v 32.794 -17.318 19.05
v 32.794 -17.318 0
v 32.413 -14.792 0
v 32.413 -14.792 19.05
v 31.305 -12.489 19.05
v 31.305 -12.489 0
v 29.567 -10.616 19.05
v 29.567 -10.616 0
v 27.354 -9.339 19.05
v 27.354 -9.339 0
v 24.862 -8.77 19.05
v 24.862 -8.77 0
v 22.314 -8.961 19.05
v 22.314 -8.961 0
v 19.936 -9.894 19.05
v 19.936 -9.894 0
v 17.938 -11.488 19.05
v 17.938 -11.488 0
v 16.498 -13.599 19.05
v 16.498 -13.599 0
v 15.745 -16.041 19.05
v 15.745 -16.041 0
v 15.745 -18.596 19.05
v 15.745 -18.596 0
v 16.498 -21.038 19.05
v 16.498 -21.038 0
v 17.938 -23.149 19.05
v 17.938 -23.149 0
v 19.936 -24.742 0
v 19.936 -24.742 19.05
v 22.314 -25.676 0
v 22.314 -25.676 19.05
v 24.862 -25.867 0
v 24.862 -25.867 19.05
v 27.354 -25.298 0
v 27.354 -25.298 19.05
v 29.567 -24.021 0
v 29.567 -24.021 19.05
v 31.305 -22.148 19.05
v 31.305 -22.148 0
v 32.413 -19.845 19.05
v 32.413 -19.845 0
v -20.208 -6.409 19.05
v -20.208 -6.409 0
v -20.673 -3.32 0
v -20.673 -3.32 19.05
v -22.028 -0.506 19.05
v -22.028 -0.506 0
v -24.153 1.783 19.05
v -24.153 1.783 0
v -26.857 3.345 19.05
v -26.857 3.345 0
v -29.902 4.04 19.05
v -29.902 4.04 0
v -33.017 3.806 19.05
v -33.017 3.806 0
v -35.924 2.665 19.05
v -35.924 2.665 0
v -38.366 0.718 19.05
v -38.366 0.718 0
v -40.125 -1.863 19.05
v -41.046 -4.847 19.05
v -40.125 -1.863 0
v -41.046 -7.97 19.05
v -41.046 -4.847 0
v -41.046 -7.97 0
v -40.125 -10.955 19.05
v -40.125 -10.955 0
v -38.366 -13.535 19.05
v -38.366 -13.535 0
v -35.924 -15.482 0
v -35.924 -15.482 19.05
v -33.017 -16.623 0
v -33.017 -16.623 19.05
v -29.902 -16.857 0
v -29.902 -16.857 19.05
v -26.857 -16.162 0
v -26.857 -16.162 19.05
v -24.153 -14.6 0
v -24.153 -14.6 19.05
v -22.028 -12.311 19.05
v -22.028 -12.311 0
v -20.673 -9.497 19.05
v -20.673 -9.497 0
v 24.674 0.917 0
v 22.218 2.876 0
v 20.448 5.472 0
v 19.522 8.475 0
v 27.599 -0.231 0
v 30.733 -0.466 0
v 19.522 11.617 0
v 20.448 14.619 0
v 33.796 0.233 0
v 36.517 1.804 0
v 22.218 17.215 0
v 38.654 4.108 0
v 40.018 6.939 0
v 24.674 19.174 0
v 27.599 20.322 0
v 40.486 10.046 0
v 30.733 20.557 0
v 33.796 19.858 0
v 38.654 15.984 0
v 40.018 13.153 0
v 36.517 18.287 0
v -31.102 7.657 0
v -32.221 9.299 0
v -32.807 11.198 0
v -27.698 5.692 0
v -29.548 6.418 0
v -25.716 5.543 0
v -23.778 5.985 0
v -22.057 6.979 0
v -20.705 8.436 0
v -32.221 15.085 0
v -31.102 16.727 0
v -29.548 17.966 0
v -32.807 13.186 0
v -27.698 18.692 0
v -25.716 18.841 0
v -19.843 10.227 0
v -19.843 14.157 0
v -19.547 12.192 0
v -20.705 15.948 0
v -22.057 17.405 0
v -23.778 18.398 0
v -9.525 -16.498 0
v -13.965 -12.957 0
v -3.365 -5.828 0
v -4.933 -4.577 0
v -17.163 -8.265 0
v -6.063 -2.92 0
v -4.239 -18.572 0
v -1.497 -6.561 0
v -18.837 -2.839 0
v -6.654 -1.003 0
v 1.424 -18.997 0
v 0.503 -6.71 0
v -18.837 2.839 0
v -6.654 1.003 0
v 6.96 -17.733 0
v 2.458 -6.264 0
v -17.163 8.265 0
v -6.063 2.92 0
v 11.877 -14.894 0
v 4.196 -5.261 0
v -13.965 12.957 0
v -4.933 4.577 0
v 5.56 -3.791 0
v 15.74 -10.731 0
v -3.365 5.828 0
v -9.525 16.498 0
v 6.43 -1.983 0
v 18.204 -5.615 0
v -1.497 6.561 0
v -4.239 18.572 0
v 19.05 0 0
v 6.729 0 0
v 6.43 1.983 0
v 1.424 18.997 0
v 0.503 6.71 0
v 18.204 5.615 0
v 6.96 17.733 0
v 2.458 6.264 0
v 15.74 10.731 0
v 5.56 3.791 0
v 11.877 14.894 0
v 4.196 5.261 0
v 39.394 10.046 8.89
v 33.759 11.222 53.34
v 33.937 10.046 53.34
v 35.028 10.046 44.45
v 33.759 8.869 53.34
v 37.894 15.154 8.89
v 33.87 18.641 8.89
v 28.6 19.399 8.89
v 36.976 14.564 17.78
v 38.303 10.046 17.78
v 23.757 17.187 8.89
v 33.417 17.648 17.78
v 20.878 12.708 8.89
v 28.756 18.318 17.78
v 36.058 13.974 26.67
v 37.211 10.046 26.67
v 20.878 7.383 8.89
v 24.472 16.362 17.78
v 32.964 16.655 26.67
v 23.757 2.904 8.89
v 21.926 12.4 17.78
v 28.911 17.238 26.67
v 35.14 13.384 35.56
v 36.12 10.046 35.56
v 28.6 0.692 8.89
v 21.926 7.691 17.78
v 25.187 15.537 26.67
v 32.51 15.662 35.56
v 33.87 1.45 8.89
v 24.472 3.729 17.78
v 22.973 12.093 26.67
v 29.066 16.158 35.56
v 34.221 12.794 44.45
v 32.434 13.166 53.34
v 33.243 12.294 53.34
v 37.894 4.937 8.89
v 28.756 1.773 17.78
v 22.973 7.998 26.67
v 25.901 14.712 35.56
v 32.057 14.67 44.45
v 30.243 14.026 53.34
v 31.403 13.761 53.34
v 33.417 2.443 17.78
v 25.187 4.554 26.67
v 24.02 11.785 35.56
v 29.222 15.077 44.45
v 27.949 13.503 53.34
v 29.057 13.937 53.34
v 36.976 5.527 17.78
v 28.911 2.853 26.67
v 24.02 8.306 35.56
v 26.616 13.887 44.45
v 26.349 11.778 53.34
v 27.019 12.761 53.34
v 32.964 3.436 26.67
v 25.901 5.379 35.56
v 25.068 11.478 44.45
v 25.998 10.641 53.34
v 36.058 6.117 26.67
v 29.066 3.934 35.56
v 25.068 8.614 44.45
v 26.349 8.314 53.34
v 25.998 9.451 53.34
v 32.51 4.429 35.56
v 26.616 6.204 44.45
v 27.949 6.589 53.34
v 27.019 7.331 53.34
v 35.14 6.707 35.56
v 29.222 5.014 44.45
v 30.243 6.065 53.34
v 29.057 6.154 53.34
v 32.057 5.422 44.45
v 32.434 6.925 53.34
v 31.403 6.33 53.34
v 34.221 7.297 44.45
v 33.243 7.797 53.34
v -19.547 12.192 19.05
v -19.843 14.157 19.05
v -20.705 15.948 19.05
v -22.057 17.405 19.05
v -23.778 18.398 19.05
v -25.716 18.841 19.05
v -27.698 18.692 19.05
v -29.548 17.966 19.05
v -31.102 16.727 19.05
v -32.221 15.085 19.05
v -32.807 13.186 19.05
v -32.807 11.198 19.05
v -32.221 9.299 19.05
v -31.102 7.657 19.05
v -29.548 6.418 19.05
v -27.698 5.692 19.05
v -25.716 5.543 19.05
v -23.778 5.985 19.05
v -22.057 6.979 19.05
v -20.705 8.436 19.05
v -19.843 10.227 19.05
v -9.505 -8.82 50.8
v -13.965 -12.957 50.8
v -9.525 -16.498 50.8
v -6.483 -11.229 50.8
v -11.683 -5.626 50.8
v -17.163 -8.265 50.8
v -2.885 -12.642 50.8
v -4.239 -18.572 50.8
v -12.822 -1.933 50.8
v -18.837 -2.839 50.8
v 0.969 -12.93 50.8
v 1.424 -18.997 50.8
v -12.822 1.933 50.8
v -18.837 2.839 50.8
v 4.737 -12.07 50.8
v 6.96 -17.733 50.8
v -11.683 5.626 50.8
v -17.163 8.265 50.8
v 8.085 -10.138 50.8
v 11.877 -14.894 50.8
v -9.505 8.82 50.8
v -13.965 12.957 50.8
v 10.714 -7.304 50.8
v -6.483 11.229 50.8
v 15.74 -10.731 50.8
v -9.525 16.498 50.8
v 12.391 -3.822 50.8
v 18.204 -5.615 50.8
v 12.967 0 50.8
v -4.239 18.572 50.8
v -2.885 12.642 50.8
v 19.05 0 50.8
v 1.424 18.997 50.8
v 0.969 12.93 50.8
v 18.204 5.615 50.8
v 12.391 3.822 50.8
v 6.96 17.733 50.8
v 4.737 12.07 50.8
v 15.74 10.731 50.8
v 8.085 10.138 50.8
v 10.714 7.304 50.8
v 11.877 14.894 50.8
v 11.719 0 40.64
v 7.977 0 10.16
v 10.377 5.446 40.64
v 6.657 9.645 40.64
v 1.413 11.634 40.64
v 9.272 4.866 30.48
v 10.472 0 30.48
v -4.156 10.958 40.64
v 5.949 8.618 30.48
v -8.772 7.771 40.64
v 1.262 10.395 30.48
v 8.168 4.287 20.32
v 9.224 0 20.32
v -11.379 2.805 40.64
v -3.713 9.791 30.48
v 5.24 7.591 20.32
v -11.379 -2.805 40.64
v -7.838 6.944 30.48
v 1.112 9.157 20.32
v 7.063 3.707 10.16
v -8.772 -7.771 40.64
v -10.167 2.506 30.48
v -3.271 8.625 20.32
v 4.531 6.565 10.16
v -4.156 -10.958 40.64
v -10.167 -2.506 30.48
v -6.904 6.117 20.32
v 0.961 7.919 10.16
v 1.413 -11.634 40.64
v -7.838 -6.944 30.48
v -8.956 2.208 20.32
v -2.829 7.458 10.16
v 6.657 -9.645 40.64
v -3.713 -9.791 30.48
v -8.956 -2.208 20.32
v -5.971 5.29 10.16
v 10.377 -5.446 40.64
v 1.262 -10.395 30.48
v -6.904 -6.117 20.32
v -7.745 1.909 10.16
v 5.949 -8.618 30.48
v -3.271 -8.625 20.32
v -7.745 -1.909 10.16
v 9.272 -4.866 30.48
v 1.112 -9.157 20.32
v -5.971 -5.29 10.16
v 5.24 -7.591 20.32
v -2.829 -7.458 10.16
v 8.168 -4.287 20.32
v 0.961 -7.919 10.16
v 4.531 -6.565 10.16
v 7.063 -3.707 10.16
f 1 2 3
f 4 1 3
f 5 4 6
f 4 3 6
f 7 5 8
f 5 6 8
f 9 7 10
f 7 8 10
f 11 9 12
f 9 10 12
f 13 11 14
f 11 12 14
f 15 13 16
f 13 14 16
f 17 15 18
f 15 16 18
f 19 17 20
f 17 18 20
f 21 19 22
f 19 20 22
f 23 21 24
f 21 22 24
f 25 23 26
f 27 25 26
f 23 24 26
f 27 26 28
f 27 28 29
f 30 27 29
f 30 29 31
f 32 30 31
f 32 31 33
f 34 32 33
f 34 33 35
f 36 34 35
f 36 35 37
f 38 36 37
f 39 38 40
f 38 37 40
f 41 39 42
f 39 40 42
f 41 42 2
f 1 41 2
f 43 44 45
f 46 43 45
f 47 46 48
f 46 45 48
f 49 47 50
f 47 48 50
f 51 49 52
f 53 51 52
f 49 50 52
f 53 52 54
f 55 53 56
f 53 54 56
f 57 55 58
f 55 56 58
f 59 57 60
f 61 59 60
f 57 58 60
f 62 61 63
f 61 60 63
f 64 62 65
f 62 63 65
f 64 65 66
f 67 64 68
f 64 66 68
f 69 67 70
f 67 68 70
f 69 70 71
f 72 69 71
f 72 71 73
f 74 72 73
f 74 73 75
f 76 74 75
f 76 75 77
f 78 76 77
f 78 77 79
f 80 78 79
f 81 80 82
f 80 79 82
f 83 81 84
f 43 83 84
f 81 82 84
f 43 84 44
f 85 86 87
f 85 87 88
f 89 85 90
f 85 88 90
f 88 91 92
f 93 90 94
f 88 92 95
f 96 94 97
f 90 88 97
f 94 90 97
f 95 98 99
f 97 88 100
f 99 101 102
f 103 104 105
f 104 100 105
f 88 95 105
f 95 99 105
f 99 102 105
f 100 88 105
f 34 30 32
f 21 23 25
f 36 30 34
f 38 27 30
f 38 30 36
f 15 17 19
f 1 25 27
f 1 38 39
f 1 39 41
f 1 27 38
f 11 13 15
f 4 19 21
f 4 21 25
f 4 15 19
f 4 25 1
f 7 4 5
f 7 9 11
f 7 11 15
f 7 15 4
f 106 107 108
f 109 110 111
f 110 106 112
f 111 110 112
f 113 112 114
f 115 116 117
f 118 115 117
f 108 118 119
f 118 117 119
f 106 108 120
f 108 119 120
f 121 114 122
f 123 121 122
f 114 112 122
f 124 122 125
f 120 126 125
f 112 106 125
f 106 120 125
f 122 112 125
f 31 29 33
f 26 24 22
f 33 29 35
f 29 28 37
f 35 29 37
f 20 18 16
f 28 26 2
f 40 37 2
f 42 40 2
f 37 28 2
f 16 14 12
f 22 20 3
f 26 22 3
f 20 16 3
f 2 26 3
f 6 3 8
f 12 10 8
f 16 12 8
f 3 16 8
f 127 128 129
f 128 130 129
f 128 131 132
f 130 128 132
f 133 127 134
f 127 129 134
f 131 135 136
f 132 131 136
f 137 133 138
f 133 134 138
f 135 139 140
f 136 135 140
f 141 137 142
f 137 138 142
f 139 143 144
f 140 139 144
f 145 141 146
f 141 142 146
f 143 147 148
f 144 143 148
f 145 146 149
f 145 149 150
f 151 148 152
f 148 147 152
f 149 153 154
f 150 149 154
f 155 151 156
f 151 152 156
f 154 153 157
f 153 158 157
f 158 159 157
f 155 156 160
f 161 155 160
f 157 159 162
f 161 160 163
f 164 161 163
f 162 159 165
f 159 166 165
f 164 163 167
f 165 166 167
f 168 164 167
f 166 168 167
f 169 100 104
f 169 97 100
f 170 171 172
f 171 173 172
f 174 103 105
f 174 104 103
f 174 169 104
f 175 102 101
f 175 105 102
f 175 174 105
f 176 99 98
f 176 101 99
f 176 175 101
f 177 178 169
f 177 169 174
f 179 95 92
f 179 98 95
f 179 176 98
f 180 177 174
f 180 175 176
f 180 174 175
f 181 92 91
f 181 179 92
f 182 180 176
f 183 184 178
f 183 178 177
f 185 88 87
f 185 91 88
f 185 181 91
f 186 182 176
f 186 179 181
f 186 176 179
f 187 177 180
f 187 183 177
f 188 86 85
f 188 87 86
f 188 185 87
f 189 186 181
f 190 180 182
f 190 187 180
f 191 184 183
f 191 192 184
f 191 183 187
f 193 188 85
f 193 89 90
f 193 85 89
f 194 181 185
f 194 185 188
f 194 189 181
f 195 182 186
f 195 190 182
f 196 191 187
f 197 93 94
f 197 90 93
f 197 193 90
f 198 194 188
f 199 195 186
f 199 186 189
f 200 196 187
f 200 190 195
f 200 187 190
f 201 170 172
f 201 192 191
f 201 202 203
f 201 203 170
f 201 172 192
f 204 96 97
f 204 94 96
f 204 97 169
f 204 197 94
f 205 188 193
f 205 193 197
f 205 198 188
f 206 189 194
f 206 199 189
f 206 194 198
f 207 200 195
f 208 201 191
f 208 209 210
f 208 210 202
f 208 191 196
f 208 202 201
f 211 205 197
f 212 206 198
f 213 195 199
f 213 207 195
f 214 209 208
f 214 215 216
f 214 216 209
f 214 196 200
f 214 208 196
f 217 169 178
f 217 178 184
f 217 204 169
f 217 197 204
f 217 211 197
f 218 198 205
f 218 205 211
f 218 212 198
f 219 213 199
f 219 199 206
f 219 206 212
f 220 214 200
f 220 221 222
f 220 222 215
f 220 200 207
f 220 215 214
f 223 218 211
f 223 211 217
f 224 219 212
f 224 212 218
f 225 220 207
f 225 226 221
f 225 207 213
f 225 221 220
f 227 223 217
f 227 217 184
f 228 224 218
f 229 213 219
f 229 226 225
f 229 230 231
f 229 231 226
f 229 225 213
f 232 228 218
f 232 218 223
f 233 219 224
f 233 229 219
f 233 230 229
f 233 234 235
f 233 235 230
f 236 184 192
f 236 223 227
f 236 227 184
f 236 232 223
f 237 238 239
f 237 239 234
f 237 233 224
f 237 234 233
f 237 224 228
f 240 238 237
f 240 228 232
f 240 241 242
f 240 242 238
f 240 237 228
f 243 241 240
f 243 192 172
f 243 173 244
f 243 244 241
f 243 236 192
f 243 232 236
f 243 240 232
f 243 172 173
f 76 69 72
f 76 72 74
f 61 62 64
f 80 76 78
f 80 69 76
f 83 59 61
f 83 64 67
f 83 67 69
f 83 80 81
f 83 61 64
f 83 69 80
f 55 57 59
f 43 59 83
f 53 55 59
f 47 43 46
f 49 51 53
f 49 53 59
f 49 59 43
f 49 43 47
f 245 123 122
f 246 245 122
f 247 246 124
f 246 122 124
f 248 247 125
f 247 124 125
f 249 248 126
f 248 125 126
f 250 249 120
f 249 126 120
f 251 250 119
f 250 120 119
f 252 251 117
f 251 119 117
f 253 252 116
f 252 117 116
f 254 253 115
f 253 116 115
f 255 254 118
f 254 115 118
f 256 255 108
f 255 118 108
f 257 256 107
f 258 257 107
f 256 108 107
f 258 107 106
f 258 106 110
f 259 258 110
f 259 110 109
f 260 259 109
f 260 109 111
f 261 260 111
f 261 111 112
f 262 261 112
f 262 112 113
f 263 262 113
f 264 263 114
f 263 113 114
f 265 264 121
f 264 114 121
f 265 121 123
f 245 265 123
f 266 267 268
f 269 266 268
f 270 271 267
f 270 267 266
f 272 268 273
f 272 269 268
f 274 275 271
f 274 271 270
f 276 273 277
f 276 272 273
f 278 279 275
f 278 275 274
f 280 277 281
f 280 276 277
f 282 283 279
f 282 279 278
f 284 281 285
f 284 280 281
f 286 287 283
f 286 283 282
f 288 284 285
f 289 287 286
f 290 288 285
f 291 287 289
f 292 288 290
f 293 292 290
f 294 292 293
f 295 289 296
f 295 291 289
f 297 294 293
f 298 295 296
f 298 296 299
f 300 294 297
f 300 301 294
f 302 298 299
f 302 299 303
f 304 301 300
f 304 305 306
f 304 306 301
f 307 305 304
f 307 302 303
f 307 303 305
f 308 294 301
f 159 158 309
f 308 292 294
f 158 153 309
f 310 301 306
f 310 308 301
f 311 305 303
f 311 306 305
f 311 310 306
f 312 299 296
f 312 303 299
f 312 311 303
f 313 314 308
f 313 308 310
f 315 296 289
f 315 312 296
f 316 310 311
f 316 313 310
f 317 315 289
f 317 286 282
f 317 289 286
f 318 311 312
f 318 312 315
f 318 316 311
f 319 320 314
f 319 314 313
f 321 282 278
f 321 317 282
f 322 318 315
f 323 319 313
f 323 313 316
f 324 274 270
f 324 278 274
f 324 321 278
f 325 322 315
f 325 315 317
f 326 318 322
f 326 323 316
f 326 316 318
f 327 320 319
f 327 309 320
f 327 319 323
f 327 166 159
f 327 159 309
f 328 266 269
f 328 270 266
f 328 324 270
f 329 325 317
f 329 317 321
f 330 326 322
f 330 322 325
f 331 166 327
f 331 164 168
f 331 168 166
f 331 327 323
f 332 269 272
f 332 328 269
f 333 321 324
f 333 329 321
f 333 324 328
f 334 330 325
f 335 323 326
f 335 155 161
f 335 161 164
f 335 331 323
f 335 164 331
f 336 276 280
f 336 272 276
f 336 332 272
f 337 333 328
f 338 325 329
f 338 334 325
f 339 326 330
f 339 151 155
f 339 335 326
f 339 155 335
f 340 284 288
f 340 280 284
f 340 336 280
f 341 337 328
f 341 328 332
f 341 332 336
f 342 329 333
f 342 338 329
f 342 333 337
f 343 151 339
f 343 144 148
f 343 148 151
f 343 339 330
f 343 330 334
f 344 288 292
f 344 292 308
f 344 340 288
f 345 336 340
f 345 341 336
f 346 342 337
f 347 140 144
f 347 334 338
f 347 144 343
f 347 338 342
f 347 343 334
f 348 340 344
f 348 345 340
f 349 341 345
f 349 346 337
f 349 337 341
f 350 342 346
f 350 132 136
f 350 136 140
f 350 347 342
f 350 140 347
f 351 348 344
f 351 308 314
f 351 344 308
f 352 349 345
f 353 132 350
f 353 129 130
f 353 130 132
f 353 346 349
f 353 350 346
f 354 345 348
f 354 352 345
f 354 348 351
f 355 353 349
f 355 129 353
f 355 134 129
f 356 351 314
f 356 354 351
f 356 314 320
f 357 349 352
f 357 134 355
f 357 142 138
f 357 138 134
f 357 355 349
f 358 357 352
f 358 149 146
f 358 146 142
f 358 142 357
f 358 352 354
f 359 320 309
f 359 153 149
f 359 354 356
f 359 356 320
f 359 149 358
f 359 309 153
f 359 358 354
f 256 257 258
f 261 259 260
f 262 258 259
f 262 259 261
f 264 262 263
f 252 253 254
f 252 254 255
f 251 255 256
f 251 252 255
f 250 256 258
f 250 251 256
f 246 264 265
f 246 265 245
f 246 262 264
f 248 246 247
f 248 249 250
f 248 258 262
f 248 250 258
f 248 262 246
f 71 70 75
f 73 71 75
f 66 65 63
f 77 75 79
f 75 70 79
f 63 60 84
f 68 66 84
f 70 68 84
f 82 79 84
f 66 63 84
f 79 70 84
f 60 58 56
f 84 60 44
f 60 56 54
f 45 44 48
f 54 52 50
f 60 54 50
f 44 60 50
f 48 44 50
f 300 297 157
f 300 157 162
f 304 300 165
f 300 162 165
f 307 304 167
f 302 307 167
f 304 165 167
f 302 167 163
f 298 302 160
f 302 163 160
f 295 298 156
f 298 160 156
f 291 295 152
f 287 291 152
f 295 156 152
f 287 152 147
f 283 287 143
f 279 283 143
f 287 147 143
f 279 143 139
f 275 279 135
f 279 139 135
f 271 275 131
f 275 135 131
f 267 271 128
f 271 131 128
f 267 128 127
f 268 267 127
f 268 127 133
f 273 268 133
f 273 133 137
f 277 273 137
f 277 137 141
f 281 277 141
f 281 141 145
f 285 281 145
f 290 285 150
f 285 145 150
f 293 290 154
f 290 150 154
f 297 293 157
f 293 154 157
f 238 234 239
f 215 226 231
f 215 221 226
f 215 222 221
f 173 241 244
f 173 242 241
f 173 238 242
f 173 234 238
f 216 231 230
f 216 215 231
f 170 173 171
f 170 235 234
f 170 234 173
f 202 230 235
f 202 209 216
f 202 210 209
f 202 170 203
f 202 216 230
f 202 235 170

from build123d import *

# Parameters (mm, degrees)
F0_R      = 19.05
F1_DEPTH  = 50.8
F2_R      = 12.9667
F3_DEPTH  = 50.801
F3_TAPER  = 7
F4_R      = 6.6675
F5_DEPTH  = 19.05
F6_R      = 8.5725
F7_DEPTH  = 19.05
F8_R      = 10.4775
F9_DEPTH  = 19.05
F10_R     = 10.541
F11_DEPTH = 53.34
F11_TAPER = 7


with BuildPart() as f1:
    # F0 (on Top) → F1 (new body)
    with BuildSketch(Plane.XY):
        Circle(F0_R)
    extrude(amount=F1_DEPTH)

    # F2 (on face) → F3 (cut, through all)
    with BuildSketch(Plane.XY.offset(50.8)):
        Circle(F2_R)
    extrude(amount=-F3_DEPTH, taper=F3_TAPER, mode=Mode.SUBTRACT)


with BuildPart() as f5:
    # F4 (on Top) → F5 (new body)
    with BuildSketch(Plane.XY):
        with Locations((-26.2140743434, 12.1918460354)):
            Circle(F4_R)
    extrude(amount=F5_DEPTH)


with BuildPart() as f7:
    # F6 (on Top) → F7 (new body)
    with BuildSketch(Plane.XY):
        with Locations((24.2217630148, -17.3184871674)):
            Circle(F6_R)
    extrude(amount=F7_DEPTH)


with BuildPart() as f9:
    # F8 (on Top) → F9 (new body)
    with BuildSketch(Plane.XY):
        with Locations((-30.6853372604, -6.4086052589)):
            Circle(F8_R)
    extrude(amount=F9_DEPTH)


with BuildPart() as f11:
    # F10 (on Top) → F11 (new body)
    with BuildSketch(Plane.XY):
        with Locations((29.944980517, 10.0456401706)):
            Circle(F10_R)
    extrude(amount=F11_DEPTH, taper=F11_TAPER)


solid = Compound([f1.part, f5.part, f7.part, f9.part, f11.part])
